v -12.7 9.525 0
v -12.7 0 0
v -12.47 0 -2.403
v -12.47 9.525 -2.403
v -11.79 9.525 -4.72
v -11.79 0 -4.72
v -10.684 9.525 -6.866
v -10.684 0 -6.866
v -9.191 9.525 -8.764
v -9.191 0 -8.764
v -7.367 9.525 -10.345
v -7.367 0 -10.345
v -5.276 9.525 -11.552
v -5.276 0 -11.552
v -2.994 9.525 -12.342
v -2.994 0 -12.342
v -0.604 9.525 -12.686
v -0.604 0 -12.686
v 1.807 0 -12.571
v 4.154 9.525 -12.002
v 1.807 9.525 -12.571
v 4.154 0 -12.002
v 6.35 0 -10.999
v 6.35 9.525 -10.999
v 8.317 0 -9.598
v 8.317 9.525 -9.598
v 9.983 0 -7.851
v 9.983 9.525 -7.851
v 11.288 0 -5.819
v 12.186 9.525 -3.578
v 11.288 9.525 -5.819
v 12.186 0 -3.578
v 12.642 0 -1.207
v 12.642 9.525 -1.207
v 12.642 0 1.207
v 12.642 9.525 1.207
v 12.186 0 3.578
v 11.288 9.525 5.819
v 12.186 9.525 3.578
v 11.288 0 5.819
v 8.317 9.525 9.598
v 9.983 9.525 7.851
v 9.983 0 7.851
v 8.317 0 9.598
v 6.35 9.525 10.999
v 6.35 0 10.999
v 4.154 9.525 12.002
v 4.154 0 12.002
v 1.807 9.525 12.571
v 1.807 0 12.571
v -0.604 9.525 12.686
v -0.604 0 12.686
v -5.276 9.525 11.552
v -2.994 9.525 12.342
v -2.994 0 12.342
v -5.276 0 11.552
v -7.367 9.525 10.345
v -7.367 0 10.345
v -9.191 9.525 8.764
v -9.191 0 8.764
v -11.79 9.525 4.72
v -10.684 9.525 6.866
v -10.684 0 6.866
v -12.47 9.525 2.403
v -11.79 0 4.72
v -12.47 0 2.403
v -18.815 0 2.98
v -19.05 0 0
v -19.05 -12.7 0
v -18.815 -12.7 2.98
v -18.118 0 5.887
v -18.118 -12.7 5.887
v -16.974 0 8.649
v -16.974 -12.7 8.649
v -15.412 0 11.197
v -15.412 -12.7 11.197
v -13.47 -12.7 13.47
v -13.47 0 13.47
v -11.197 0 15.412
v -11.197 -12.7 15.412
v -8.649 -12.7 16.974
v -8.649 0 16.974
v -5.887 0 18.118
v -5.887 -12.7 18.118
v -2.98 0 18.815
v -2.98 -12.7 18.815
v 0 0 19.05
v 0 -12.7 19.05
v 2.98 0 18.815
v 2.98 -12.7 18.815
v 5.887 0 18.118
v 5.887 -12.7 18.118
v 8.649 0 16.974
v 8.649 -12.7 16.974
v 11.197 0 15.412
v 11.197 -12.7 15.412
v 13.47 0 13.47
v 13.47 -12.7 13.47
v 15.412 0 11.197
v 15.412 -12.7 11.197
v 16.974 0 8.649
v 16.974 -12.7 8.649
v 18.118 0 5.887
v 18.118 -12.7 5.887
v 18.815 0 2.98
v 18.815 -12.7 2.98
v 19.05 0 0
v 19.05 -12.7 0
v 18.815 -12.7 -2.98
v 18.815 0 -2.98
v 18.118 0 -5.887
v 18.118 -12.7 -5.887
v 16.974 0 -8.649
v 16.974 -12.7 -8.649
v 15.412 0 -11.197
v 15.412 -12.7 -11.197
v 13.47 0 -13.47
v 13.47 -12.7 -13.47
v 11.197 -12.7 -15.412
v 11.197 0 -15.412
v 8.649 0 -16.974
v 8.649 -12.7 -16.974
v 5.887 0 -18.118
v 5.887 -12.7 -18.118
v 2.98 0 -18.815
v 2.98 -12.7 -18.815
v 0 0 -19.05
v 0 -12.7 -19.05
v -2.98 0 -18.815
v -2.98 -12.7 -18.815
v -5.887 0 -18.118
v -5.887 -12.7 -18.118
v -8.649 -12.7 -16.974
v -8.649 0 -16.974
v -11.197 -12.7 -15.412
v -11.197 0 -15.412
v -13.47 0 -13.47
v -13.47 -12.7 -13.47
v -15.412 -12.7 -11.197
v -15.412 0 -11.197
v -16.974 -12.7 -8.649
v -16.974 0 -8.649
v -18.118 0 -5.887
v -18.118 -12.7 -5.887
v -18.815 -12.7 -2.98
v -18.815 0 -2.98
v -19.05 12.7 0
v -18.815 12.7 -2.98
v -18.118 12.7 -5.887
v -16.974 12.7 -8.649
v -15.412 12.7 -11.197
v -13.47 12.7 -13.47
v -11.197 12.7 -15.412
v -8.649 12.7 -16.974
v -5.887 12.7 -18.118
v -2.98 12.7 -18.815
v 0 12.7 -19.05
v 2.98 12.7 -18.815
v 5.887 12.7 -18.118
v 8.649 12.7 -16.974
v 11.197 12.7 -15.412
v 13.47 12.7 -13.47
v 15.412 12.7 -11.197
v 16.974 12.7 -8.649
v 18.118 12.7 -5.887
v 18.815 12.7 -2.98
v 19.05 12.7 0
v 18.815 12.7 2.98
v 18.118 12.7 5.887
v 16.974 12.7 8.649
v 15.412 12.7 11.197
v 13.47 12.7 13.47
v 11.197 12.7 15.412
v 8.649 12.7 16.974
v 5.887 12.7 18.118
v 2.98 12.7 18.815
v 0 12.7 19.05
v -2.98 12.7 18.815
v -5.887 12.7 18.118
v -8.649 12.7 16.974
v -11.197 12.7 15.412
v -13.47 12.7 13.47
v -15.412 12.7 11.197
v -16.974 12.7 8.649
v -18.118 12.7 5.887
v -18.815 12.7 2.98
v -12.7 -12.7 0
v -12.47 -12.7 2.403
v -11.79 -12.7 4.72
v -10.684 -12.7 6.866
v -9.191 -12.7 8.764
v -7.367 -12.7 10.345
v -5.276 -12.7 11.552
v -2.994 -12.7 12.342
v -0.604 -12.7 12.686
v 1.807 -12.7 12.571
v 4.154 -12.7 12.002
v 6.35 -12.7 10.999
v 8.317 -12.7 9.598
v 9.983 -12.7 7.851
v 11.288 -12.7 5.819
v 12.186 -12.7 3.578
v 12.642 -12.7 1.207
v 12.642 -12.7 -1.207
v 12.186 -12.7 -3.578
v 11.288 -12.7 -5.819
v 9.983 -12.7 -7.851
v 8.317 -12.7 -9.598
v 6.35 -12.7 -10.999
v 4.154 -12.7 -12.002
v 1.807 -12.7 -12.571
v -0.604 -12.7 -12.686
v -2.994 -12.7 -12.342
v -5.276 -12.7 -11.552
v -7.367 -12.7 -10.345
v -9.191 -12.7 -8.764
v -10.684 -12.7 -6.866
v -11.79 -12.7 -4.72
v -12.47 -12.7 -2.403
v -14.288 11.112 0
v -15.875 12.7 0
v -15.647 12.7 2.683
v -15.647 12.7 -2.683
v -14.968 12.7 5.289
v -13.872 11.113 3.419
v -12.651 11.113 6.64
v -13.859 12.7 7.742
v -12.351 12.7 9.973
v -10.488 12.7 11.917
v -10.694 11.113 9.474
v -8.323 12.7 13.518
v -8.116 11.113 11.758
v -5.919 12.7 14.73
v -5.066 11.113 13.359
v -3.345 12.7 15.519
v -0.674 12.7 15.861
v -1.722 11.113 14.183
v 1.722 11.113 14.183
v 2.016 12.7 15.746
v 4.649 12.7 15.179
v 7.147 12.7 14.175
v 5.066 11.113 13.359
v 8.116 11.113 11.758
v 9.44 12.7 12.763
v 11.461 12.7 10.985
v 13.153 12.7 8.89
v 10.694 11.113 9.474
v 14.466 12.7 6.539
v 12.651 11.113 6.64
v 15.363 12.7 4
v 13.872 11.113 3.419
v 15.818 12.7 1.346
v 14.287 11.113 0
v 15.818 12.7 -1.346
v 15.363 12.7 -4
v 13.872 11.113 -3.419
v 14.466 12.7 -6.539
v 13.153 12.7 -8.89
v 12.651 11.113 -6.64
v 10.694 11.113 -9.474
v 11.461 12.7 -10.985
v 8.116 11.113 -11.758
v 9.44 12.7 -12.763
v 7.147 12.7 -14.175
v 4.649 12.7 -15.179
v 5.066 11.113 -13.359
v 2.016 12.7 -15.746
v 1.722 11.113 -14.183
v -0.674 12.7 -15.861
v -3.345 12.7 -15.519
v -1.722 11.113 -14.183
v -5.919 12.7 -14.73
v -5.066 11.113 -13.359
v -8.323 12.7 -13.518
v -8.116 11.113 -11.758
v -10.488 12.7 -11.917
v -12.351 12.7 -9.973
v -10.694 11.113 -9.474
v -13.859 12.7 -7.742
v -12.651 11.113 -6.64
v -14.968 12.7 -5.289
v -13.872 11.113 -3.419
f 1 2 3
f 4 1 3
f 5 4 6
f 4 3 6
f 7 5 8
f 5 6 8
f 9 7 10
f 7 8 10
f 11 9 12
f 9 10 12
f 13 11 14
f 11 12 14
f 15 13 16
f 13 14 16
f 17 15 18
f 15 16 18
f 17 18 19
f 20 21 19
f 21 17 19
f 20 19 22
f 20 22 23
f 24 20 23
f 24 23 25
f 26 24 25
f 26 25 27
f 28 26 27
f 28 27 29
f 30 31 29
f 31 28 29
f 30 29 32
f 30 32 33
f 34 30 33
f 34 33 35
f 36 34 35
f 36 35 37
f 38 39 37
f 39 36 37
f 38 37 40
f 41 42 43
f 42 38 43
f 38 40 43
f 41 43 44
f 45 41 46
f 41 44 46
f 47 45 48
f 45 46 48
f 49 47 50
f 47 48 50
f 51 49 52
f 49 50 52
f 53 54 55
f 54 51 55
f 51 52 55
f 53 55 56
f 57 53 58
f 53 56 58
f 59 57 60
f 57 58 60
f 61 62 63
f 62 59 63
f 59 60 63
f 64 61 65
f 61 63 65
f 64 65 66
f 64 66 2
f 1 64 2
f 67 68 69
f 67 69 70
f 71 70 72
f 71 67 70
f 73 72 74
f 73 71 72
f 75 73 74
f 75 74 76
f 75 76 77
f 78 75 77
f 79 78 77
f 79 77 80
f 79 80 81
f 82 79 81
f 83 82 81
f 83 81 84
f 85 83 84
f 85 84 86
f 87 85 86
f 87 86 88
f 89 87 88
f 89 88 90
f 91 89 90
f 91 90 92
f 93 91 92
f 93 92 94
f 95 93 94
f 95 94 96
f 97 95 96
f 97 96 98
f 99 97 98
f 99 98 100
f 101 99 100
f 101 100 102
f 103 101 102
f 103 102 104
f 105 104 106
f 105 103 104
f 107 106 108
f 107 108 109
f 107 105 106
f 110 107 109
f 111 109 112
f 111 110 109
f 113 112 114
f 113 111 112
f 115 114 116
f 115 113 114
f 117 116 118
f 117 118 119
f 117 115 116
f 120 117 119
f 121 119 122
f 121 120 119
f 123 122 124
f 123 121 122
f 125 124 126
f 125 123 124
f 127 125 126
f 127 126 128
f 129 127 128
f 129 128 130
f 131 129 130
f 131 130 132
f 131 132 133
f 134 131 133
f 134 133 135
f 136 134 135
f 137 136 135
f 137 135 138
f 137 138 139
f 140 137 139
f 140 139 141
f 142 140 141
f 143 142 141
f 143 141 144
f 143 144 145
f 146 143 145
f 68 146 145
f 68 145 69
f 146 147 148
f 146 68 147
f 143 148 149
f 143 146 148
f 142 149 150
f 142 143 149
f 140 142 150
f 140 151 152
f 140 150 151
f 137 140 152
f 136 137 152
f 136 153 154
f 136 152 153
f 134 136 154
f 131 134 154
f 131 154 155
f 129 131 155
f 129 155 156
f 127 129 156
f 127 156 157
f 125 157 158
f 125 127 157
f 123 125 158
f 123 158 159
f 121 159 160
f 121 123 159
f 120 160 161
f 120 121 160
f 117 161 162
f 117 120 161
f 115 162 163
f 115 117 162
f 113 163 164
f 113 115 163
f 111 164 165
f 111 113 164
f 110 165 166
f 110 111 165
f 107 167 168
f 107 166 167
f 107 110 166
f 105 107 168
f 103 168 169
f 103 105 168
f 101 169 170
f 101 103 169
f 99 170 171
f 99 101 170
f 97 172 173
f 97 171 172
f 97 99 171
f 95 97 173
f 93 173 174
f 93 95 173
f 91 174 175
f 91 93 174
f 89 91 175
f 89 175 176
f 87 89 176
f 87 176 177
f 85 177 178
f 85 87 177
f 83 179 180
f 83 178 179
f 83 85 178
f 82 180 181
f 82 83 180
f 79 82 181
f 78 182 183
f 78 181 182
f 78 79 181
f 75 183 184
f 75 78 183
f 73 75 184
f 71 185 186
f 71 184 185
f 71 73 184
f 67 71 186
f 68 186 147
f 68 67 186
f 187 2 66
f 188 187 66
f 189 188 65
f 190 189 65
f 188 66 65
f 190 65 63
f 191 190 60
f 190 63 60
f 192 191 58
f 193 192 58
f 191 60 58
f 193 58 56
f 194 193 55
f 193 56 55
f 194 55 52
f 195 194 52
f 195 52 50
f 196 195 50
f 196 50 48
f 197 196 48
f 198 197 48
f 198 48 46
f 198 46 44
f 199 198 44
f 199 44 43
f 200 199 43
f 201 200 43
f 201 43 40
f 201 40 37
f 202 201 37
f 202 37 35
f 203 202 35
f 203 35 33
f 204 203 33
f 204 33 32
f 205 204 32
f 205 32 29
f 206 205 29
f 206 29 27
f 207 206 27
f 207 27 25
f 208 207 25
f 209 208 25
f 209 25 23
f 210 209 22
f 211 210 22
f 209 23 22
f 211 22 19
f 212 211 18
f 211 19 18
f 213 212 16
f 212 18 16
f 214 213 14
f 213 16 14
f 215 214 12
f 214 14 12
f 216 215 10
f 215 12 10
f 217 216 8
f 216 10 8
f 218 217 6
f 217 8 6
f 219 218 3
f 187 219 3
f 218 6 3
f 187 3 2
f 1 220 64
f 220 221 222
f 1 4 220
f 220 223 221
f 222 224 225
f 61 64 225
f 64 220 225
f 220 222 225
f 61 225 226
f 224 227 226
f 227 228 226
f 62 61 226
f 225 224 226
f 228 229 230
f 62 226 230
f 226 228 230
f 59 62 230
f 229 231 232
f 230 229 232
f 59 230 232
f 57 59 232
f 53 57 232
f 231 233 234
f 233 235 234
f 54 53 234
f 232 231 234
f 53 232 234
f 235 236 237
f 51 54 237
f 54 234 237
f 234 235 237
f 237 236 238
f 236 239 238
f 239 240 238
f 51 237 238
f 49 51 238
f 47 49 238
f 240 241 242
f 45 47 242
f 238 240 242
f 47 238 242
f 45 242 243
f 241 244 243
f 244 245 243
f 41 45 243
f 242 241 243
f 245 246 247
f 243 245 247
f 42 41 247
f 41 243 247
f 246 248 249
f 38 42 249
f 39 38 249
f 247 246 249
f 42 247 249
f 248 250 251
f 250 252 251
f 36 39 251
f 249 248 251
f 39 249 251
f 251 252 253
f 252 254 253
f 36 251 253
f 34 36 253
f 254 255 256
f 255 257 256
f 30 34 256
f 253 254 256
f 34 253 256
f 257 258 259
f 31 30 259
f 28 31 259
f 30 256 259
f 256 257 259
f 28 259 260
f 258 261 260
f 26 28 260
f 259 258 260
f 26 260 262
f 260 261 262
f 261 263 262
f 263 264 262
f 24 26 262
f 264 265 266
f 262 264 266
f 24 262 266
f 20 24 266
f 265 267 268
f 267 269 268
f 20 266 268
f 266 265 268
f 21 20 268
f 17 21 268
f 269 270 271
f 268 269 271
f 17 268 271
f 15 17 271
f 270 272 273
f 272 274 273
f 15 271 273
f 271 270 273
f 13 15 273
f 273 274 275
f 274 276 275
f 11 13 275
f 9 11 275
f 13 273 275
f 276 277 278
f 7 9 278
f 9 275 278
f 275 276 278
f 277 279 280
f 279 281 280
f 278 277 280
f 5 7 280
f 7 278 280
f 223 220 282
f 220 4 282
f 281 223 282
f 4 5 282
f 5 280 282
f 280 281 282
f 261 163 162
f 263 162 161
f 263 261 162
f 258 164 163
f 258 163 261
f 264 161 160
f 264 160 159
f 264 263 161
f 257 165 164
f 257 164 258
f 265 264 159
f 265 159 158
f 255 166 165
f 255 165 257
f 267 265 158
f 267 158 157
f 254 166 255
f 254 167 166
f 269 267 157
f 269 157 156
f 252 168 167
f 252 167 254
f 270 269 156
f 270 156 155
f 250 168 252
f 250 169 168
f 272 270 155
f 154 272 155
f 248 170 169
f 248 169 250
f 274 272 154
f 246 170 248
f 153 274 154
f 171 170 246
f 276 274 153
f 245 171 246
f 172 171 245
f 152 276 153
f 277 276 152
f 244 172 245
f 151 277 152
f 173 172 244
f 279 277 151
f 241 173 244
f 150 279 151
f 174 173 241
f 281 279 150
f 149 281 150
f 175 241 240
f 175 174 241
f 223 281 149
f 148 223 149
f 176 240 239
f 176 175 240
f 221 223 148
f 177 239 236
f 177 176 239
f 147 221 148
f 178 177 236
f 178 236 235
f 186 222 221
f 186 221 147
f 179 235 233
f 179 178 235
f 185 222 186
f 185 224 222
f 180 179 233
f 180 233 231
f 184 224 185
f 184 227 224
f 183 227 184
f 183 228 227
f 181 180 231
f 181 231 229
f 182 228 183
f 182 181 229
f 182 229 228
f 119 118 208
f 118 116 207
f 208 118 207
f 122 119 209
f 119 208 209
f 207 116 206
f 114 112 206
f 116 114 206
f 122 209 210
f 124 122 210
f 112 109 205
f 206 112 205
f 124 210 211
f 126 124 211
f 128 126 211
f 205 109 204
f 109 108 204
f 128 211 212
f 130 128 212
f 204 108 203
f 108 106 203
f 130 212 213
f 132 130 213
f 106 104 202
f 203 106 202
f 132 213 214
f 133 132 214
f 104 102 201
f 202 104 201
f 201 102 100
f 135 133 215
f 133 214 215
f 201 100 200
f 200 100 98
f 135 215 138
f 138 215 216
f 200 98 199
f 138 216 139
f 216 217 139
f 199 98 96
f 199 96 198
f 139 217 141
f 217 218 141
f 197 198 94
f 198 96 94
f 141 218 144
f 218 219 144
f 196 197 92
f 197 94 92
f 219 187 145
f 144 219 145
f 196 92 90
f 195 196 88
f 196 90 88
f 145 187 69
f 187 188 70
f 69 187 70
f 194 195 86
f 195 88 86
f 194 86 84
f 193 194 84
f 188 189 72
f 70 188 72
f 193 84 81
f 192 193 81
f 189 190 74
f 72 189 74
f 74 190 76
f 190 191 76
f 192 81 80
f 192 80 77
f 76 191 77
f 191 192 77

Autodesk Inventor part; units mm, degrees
ref_plane "YZ Plane" through (0, 0, 0) normal (1, 0, 0) x (0, 1, 0)
ref_plane "XZ Plane" through (0, 0, 0) normal (0, 1, 0) x (-1, 0, 0)
ref_plane "XY Plane" through (0, 0, 0) normal (0, 0, 1) x (1, 0, 0)
sketch "Sketch3" plane through (0, 0, 0) normal (0, 1, 0) x (-1, 0, 0)
  circle A0 centre (0, 0) radius 12.7
  circle A1 centre (0, 0) radius 19.05
  dimension "d7" = 25.4
  dimension "d8" = 38.1
extrude "Extrusion1" add sketch "Sketch3" along normal mid plane 25.4
chamfer "Chamfer1" distance 3.175 angle 45 1 edges at (12.7, 12.7, 0)
properties part number "Tube"
